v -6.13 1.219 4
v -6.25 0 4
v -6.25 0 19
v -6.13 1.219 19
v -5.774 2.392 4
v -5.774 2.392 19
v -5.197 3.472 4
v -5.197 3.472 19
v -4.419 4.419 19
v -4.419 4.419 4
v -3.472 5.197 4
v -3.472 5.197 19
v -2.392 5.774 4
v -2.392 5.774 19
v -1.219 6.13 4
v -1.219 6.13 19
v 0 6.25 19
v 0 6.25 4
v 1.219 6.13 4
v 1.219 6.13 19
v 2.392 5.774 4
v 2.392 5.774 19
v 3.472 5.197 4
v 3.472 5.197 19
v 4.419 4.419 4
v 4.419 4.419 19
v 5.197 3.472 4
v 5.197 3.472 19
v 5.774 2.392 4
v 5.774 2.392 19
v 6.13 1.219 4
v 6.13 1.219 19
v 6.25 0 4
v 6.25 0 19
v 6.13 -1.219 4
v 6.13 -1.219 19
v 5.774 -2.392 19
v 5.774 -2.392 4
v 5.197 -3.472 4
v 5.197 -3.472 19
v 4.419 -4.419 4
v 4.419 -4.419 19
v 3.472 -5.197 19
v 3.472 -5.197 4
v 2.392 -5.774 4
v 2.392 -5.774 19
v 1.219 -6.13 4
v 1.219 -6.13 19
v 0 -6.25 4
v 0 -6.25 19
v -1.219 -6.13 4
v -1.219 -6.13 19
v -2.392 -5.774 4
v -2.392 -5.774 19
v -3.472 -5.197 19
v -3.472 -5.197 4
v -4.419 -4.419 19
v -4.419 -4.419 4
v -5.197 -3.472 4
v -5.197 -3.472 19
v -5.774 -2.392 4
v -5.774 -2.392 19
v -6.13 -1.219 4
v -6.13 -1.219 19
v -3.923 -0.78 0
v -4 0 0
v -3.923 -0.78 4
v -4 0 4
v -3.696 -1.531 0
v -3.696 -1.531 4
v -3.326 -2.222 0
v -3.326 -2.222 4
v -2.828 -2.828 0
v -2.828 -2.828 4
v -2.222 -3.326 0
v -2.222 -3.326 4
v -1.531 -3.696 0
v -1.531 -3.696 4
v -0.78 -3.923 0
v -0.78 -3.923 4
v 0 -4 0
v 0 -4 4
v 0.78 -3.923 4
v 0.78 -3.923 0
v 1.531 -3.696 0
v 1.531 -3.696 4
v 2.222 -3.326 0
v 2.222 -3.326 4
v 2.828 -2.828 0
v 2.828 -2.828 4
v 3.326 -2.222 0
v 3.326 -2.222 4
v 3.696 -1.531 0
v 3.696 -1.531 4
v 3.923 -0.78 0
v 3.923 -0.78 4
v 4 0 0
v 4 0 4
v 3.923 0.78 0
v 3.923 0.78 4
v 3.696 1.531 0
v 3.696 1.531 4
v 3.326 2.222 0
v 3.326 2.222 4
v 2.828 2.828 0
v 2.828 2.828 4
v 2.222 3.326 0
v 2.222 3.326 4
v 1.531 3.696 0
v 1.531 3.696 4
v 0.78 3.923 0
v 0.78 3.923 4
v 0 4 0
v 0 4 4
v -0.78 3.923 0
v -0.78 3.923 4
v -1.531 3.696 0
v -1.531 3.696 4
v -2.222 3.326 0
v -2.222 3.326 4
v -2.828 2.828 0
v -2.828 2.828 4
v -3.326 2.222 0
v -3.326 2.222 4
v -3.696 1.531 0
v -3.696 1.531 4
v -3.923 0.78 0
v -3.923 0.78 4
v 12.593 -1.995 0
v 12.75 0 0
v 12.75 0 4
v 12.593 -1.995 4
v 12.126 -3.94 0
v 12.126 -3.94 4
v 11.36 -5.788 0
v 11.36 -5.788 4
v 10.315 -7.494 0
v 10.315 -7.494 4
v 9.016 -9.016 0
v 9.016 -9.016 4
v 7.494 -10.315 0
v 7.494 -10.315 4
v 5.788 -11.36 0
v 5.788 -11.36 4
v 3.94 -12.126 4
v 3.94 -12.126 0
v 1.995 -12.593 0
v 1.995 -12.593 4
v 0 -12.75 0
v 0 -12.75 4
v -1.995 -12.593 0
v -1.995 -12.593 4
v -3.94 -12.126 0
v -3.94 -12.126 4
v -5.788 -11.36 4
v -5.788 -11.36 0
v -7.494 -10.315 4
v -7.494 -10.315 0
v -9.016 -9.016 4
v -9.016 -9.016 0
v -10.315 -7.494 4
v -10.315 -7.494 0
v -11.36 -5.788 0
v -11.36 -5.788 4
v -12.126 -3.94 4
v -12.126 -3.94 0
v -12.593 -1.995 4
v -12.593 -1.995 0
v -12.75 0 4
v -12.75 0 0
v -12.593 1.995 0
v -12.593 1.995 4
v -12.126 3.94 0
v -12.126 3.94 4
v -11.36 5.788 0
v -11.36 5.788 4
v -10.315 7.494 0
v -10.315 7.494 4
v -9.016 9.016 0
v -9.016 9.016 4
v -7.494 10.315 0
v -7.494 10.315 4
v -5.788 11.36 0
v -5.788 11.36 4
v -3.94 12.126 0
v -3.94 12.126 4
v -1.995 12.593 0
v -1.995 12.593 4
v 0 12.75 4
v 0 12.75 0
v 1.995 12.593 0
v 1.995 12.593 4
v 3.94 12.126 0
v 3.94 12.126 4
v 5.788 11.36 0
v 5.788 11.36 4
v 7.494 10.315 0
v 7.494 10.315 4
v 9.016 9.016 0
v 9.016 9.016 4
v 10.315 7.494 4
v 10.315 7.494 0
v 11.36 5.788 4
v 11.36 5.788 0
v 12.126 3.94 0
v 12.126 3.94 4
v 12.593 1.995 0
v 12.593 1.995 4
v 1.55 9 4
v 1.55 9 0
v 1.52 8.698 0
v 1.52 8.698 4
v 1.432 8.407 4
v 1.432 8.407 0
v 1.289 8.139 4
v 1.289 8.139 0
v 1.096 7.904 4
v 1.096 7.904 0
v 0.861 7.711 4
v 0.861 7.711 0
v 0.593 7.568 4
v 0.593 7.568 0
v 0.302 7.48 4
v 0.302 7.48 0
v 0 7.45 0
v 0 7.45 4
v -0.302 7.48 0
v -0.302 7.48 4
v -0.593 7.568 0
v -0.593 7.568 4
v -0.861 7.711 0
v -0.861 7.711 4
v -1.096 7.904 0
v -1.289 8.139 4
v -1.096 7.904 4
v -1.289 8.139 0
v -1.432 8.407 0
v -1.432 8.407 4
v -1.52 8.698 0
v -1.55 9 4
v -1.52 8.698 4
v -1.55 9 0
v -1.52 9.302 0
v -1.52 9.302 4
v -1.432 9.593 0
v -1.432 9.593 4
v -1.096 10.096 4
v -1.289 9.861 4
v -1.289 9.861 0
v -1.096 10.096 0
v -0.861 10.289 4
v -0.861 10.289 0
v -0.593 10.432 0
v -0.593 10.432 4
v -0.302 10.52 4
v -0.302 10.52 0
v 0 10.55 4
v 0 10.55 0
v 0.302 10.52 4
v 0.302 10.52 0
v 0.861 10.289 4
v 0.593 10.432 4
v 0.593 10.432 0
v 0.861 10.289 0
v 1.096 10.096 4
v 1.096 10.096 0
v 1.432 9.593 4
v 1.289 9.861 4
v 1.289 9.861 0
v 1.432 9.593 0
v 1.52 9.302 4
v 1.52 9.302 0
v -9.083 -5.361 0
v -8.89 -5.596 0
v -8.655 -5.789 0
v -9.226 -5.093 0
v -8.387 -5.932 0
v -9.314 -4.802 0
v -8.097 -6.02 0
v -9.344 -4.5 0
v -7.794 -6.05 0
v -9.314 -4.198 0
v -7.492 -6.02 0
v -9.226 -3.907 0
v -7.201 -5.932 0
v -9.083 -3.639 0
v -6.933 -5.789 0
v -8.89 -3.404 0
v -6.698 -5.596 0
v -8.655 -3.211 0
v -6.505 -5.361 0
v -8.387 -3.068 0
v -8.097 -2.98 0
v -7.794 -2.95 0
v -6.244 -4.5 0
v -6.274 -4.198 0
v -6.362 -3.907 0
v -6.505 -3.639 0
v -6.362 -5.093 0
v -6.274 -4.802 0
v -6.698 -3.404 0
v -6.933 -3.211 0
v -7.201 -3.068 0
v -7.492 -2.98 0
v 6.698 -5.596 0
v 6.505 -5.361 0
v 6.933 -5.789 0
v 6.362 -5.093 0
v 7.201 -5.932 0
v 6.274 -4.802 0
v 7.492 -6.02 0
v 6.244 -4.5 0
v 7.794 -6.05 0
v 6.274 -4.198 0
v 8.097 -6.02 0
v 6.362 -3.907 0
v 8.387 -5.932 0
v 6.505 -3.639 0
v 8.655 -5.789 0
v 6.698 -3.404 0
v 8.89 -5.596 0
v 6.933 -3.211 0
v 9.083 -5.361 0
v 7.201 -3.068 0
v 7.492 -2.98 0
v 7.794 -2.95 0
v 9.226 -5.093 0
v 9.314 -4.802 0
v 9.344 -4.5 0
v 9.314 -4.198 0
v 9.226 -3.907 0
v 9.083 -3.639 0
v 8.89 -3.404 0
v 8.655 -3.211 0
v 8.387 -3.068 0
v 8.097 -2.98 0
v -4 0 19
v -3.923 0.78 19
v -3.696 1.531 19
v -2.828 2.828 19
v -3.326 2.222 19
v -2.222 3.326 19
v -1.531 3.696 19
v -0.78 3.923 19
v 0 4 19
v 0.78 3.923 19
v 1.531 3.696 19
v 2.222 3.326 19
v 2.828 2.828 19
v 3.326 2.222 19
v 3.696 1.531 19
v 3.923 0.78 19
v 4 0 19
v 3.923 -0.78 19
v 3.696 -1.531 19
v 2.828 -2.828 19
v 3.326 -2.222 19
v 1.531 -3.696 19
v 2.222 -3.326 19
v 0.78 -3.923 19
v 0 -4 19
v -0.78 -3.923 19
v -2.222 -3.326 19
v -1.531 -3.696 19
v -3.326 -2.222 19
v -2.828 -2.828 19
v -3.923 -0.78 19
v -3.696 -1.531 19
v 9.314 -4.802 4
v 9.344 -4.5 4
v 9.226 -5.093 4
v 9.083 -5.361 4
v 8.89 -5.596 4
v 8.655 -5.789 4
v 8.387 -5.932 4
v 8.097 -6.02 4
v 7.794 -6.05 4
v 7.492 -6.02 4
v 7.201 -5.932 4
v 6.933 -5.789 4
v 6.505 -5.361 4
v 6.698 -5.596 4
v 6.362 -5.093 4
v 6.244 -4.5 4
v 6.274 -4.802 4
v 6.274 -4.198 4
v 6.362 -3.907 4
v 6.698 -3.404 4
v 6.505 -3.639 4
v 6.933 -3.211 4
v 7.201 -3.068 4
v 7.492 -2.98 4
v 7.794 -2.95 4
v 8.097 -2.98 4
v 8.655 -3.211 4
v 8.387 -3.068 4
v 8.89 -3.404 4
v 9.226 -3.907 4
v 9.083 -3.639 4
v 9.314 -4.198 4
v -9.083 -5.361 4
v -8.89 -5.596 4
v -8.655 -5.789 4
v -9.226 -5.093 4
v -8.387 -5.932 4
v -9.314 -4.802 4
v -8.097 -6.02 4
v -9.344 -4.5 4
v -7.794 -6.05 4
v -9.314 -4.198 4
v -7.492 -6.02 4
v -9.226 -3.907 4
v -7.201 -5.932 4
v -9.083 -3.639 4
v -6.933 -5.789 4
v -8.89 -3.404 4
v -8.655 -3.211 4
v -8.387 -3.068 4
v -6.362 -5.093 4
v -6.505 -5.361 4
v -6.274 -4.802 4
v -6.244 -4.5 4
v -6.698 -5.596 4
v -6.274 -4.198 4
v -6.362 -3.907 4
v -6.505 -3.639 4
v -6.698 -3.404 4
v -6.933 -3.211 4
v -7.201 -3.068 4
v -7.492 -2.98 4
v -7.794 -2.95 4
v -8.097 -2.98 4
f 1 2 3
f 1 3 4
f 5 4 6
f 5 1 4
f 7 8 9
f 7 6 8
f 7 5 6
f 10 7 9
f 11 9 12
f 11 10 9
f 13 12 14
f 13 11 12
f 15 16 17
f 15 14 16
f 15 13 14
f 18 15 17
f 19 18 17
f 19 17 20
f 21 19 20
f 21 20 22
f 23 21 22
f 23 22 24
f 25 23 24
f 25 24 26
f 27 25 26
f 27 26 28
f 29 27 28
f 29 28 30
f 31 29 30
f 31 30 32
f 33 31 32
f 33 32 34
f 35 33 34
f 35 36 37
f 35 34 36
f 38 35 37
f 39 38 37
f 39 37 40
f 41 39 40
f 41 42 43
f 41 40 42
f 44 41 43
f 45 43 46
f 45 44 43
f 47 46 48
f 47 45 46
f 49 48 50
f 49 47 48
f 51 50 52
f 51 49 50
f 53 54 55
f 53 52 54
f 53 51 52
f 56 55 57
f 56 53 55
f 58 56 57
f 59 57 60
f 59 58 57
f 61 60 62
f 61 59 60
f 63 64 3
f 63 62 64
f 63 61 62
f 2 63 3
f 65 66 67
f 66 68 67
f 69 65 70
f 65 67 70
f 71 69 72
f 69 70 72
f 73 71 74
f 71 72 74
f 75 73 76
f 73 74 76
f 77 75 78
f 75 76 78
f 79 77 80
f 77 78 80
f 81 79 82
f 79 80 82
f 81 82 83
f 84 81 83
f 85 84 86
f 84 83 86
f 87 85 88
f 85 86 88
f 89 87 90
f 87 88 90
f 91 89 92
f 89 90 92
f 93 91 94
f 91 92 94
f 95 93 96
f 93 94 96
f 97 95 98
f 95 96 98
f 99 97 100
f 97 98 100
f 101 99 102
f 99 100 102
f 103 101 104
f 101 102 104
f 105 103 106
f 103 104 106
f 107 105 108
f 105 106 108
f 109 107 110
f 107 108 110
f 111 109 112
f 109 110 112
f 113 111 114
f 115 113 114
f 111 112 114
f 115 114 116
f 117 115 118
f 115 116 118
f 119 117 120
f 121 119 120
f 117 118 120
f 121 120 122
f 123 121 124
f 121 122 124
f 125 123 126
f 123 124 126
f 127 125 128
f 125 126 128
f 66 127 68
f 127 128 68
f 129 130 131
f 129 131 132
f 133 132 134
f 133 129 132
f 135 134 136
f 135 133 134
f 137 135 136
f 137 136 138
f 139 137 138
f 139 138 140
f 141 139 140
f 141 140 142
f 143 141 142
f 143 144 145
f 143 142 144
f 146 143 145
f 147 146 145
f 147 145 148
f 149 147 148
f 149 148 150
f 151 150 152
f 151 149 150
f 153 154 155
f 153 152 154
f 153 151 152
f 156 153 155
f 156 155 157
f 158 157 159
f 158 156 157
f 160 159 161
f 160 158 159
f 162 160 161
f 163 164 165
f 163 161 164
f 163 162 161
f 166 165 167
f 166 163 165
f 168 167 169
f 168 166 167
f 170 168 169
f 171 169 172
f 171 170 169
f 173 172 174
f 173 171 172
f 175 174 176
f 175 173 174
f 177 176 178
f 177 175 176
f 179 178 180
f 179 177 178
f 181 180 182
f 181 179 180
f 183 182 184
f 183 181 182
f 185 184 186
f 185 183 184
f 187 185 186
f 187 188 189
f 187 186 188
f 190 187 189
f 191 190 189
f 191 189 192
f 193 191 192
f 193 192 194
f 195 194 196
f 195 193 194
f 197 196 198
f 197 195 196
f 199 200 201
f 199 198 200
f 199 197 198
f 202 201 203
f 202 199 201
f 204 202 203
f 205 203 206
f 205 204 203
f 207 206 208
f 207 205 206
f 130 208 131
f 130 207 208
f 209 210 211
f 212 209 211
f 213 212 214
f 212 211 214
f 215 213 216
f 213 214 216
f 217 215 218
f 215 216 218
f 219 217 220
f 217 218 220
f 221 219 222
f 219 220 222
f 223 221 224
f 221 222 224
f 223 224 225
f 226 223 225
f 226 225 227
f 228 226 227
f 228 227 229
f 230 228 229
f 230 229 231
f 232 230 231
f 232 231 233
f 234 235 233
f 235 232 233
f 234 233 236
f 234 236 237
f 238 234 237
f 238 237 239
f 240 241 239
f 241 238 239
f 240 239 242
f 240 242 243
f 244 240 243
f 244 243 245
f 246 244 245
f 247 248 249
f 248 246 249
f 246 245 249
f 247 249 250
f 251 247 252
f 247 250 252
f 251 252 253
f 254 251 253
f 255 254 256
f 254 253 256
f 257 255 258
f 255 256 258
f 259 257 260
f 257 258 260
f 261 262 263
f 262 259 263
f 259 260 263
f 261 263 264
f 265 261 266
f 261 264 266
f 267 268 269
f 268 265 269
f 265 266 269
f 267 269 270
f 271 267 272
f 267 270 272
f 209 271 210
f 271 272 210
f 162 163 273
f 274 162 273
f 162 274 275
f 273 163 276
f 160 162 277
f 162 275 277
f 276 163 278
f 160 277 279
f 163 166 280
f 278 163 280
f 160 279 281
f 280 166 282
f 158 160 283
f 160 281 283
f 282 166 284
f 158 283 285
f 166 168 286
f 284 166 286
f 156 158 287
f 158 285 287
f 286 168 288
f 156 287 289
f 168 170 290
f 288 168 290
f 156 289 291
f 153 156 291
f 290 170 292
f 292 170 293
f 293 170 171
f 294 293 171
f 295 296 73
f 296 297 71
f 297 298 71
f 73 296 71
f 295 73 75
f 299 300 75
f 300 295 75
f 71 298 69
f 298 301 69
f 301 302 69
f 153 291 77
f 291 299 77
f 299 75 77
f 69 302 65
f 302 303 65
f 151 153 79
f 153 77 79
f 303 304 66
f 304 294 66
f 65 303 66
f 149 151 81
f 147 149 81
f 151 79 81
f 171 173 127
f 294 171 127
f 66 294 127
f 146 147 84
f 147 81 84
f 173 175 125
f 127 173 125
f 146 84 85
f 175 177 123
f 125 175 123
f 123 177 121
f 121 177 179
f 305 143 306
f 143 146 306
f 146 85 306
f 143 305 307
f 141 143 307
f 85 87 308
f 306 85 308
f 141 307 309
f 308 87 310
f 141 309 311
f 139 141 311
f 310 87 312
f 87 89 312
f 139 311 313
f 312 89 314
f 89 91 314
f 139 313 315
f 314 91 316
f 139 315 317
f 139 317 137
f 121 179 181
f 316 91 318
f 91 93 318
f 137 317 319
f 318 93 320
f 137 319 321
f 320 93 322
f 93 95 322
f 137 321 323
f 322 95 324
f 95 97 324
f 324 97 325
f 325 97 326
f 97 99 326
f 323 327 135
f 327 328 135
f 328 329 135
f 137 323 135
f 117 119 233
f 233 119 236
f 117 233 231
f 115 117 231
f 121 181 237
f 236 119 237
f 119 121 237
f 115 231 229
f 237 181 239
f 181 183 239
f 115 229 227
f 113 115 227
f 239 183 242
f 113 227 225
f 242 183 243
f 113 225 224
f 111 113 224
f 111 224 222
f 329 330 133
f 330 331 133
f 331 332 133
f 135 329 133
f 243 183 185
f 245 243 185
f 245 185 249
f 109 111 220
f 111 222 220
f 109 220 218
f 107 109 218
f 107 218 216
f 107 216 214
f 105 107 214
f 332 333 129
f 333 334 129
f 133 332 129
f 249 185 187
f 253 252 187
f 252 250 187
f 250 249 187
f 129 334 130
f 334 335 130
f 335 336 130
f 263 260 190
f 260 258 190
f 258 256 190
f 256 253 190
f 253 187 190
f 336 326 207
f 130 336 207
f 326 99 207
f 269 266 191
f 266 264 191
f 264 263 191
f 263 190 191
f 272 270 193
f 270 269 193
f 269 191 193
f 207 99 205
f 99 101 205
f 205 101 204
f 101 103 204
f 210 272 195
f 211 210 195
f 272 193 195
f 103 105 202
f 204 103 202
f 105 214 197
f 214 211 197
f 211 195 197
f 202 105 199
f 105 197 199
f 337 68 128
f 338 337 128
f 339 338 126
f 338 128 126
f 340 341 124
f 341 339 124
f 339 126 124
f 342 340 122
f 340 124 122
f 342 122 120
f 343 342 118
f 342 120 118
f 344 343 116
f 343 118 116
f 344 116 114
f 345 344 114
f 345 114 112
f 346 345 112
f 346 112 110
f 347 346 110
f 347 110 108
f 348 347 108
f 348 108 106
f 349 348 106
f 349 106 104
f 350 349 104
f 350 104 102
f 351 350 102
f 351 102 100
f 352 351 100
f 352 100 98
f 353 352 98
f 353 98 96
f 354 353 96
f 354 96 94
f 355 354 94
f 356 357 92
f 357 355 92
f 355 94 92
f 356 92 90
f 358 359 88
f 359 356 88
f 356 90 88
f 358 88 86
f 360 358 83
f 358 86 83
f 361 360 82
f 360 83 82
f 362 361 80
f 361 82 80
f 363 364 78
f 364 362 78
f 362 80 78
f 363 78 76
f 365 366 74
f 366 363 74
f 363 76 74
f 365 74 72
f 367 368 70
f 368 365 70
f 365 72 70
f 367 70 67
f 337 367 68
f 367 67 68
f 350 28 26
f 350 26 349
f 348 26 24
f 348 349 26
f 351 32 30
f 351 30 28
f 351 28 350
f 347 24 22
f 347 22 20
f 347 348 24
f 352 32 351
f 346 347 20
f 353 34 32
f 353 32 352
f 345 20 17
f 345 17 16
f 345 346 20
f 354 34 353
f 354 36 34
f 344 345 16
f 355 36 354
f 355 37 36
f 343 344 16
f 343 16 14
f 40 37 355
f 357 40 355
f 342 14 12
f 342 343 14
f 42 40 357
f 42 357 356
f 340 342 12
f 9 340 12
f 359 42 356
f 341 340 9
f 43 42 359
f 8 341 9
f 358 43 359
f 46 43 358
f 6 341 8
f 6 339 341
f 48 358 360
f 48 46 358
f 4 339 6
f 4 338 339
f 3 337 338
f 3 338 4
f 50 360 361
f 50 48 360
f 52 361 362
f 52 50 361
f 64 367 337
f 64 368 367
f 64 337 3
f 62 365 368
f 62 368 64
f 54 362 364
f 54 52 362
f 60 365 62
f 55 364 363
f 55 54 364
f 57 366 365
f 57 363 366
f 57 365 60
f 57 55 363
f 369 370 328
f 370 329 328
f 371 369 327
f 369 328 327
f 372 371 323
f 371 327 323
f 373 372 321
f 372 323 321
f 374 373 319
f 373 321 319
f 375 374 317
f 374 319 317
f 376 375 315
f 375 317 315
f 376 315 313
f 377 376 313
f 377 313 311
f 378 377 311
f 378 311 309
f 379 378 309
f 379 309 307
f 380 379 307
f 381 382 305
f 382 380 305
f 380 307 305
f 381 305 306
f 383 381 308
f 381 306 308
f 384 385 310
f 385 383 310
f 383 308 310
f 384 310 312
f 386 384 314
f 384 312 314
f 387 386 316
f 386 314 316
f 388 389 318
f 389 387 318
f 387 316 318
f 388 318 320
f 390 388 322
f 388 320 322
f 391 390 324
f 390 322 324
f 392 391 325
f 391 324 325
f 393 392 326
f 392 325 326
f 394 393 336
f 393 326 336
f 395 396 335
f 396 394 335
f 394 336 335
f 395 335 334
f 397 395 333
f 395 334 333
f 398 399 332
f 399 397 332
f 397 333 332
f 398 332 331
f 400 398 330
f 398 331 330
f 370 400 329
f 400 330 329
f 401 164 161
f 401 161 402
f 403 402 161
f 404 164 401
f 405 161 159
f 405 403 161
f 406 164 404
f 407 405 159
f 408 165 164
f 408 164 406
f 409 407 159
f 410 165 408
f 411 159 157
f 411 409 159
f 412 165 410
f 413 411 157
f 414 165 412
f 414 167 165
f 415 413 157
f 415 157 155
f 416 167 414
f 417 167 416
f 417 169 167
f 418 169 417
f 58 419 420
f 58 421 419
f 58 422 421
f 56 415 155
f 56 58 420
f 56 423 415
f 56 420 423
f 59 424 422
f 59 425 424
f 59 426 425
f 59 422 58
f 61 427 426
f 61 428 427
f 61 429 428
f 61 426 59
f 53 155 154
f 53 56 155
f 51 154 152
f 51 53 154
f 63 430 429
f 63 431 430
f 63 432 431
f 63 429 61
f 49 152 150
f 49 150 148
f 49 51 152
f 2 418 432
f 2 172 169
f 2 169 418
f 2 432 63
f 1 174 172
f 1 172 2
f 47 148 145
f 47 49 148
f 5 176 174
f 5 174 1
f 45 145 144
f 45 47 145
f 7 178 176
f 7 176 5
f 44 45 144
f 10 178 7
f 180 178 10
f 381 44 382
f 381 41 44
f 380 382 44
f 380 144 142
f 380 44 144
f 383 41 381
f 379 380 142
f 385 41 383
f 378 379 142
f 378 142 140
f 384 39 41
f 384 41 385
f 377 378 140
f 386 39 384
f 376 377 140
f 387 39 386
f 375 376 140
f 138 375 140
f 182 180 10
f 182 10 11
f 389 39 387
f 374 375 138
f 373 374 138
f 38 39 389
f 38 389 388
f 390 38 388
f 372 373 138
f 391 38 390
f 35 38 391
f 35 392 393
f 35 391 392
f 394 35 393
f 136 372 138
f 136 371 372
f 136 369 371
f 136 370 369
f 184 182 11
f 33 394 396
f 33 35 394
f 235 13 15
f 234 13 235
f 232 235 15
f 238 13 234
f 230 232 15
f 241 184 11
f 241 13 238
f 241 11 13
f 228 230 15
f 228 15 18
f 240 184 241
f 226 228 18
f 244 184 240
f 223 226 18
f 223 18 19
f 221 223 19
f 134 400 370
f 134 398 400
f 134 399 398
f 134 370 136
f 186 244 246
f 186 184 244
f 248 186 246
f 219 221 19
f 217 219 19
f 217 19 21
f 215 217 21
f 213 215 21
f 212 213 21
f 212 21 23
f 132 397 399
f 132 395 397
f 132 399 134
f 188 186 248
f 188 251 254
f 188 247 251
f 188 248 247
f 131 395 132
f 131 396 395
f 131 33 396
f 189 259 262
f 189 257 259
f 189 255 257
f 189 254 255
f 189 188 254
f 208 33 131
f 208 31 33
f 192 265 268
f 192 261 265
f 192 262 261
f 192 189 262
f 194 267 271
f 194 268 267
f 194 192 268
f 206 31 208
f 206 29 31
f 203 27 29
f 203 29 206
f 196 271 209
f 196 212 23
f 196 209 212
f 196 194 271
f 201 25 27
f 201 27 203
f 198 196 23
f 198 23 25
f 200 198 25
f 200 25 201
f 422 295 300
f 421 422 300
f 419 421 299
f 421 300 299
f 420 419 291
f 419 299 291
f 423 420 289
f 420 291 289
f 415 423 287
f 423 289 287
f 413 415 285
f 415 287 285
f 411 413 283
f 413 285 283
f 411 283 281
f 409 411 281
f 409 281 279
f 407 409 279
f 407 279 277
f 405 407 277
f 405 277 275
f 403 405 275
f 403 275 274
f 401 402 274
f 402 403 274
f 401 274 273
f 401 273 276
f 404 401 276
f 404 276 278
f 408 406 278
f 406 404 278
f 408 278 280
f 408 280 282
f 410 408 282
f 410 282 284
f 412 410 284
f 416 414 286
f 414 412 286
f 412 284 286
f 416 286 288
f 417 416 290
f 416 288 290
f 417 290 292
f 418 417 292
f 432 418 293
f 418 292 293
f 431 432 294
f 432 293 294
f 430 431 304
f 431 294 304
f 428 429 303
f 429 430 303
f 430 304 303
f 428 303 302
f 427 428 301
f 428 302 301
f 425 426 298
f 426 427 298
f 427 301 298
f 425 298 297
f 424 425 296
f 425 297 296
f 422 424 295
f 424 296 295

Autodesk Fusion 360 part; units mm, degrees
sketch "Sketch1" plane through (0, 0, 0) normal (0, 0, 1) x (1, 0, 0)
  circle A0 centre (0, 0) radius 12.75
  circle A1 centre (0, 9) radius 1.55
  circle A2 centre (-7.7942, -4.5) radius 1.55
  circle A3 centre (7.7942, -4.5) radius 1.55
  dimension "d1" = 25.5
  dimension "d2" = 3.1
  dimension "d3" = 9
  dimension "d5" = 360
extrude "Extrude1" add sketch "Sketch1" along normal blind 4
sketch "Sketch2" plane through (0, 0, 4) normal (0, 0, 1) x (-1, 0, 0)
  circle A0 centre (-7.7942, 4.5) radius 1.55
  circle A1 centre (7.7942, 4.5) radius 1.55
  circle A2 centre (0, -9) radius 1.55
  circle A3 centre (0, 0) radius 12.75
  circle A4 centre (0, 0) radius 6.25
  circle A5 centre (0, 0) radius 4
  dimension "d8" = 12.5
  dimension "d9" = 8
extrude "Extrude2" add sketch "Sketch2" along normal blind 15 contours A4
extrude "Extrude3" cut 1 faces at (-0.9485, -1.8197, 4) along direction (0, 0, -1) blind 7
